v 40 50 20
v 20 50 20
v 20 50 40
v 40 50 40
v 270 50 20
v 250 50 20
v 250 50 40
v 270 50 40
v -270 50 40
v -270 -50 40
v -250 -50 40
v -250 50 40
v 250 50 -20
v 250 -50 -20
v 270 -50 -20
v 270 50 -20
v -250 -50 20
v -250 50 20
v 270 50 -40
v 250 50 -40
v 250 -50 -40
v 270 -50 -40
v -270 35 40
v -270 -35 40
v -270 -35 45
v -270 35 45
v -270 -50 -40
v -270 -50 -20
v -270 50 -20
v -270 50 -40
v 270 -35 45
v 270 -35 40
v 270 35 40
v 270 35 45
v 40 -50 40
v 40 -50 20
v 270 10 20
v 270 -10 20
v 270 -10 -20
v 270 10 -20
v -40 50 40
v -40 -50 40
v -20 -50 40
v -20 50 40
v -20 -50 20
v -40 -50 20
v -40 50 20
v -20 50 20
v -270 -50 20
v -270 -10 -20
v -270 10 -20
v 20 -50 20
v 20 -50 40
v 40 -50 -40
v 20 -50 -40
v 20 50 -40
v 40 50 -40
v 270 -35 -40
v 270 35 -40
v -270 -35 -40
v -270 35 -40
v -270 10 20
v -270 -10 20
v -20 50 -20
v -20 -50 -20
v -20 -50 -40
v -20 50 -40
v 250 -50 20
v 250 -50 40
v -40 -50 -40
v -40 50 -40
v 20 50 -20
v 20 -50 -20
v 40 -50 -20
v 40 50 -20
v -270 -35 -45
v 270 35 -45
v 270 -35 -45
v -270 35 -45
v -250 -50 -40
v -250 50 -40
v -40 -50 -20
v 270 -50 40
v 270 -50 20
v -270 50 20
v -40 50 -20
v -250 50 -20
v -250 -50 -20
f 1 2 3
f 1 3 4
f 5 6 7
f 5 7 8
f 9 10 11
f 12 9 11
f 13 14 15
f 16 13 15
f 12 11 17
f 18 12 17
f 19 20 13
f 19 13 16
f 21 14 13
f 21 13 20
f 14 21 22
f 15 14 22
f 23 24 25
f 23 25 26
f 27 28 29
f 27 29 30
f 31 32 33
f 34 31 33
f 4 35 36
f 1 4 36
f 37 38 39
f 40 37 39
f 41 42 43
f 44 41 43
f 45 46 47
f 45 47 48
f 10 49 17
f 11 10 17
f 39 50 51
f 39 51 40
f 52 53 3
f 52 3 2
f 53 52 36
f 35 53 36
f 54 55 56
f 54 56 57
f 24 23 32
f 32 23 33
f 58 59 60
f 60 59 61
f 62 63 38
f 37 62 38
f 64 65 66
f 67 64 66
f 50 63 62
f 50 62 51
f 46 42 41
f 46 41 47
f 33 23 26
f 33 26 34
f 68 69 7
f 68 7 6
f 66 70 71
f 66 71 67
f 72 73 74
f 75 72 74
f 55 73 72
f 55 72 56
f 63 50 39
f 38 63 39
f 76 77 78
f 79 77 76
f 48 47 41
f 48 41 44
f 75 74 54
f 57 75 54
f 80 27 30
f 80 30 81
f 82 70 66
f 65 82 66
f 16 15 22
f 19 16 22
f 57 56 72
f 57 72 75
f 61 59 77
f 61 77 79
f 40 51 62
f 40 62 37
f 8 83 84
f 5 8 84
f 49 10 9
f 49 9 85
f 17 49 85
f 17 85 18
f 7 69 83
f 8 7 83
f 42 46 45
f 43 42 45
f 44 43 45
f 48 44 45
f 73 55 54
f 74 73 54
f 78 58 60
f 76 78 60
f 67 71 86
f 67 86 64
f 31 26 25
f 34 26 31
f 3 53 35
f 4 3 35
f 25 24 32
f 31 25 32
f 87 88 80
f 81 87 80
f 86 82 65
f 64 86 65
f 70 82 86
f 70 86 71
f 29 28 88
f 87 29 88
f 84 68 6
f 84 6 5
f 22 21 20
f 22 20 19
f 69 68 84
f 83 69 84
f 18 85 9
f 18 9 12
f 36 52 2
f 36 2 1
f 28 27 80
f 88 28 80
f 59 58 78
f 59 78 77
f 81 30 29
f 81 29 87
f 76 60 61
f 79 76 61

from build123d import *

# Parameters (mm, degrees)
BOSS_EXTRUDE2_DEPTH        = 10
BOSS_EXTRUDE2_DEPTH_BACK   = 10
SKETCH2_W                  = 540
SKETCH2_H                  = 40
BOSS_EXTRUDE3_DEPTH        = 50
BOSS_EXTRUDE3_DEPTH_BACK   = 50
SKETCH3_W                  = 20
SKETCH3_H                  = 20
BOSS_EXTRUDE3_2_DEPTH      = 50
BOSS_EXTRUDE3_2_DEPTH_BACK = 50
BOSS_EXTRUDE3_3_DEPTH      = 50
BOSS_EXTRUDE3_3_DEPTH_BACK = 50
BOSS_EXTRUDE3_4_DEPTH      = 50
BOSS_EXTRUDE3_4_DEPTH_BACK = 50
BOSS_EXTRUDE3_5_DEPTH      = 50
BOSS_EXTRUDE3_5_DEPTH_BACK = 50
BOSS_EXTRUDE3_6_DEPTH      = 50
BOSS_EXTRUDE3_6_DEPTH_BACK = 50
BOSS_EXTRUDE3_7_DEPTH      = 50
BOSS_EXTRUDE3_7_DEPTH_BACK = 50
BOSS_EXTRUDE3_8_DEPTH      = 50
BOSS_EXTRUDE3_8_DEPTH_BACK = 50
SKETCH9_W                  = 540
SKETCH9_H                  = 70
BOSS_EXTRUDE10_DEPTH       = 5
SKETCH10_W                 = 540
SKETCH10_H                 = 70
BOSS_EXTRUDE11_DEPTH       = 5


with BuildPart() as part:
    # Sketch2 → Boss-Extrude2 (new, two sides: drawn at the far end of the back side and taken through both)
    with BuildSketch(Plane(origin=(0, 0, 0), x_dir=(1, 0, 0), z_dir=(0, 1, 0)).offset(-BOSS_EXTRUDE2_DEPTH_BACK)):
        Rectangle(SKETCH2_W, SKETCH2_H)
    extrude(amount=BOSS_EXTRUDE2_DEPTH + BOSS_EXTRUDE2_DEPTH_BACK)


with BuildPart() as body_2:
    # Sketch3 → Boss-Extrude3 (new, two sides: drawn at the far end of the back side and taken through both)
    with BuildSketch(Plane(origin=(0, 0, 0), x_dir=(1, 0, 0), z_dir=(0, 1, 0)).offset(-BOSS_EXTRUDE3_DEPTH_BACK)):
        with Locations((-260, -30)):
            Rectangle(SKETCH3_W, SKETCH3_H)
    extrude(amount=BOSS_EXTRUDE3_DEPTH + BOSS_EXTRUDE3_DEPTH_BACK)


with BuildPart() as body_3:
    # Sketch3 → Boss-Extrude3 2 (new, two sides: drawn at the far end of the back side and taken through both)
    with BuildSketch(Plane(origin=(0, 0, 0), x_dir=(1, 0, 0), z_dir=(0, 1, 0)).offset(-BOSS_EXTRUDE3_2_DEPTH_BACK)):
        with Locations((-30, -30)):
            Rectangle(SKETCH3_W, SKETCH3_H)
    extrude(amount=BOSS_EXTRUDE3_2_DEPTH + BOSS_EXTRUDE3_2_DEPTH_BACK)


with BuildPart() as body_4:
    # Sketch3 → Boss-Extrude3 3 (new, two sides: drawn at the far end of the back side and taken through both)
    with BuildSketch(Plane(origin=(0, 0, 0), x_dir=(1, 0, 0), z_dir=(0, 1, 0)).offset(-BOSS_EXTRUDE3_3_DEPTH_BACK)):
        with Locations((-30, 30)):
            Rectangle(SKETCH3_W, SKETCH3_H)
    extrude(amount=BOSS_EXTRUDE3_3_DEPTH + BOSS_EXTRUDE3_3_DEPTH_BACK)


with BuildPart() as body_5:
    # Sketch3 → Boss-Extrude3 4 (new, two sides: drawn at the far end of the back side and taken through both)
    with BuildSketch(Plane(origin=(0, 0, 0), x_dir=(1, 0, 0), z_dir=(0, 1, 0)).offset(-BOSS_EXTRUDE3_4_DEPTH_BACK)):
        with Locations((-260, 30)):
            Rectangle(SKETCH3_W, SKETCH3_H)
    extrude(amount=BOSS_EXTRUDE3_4_DEPTH + BOSS_EXTRUDE3_4_DEPTH_BACK)


with BuildPart() as body_6:
    # Sketch3 → Boss-Extrude3 5 (new, two sides: drawn at the far end of the back side and taken through both)
    with BuildSketch(Plane(origin=(0, 0, 0), x_dir=(1, 0, 0), z_dir=(0, 1, 0)).offset(-BOSS_EXTRUDE3_5_DEPTH_BACK)):
        with Locations((260, 30)):
            Rectangle(SKETCH3_W, SKETCH3_H)
    extrude(amount=BOSS_EXTRUDE3_5_DEPTH + BOSS_EXTRUDE3_5_DEPTH_BACK)


with BuildPart() as body_7:
    # Sketch3 → Boss-Extrude3 6 (new, two sides: drawn at the far end of the back side and taken through both)
    with BuildSketch(Plane(origin=(0, 0, 0), x_dir=(1, 0, 0), z_dir=(0, 1, 0)).offset(-BOSS_EXTRUDE3_6_DEPTH_BACK)):
        with Locations((30, 30)):
            Rectangle(SKETCH3_W, SKETCH3_H)
    extrude(amount=BOSS_EXTRUDE3_6_DEPTH + BOSS_EXTRUDE3_6_DEPTH_BACK)


with BuildPart() as body_8:
    # Sketch3 → Boss-Extrude3 7 (new, two sides: drawn at the far end of the back side and taken through both)
    with BuildSketch(Plane(origin=(0, 0, 0), x_dir=(1, 0, 0), z_dir=(0, 1, 0)).offset(-BOSS_EXTRUDE3_7_DEPTH_BACK)):
        with Locations((30, -30)):
            Rectangle(SKETCH3_W, SKETCH3_H)
    extrude(amount=BOSS_EXTRUDE3_7_DEPTH + BOSS_EXTRUDE3_7_DEPTH_BACK)


with BuildPart() as body_9:
    # Sketch3 → Boss-Extrude3 8 (new, two sides: drawn at the far end of the back side and taken through both)
    with BuildSketch(Plane(origin=(0, 0, 0), x_dir=(1, 0, 0), z_dir=(0, 1, 0)).offset(-BOSS_EXTRUDE3_8_DEPTH_BACK)):
        with Locations((260, -30)):
            Rectangle(SKETCH3_W, SKETCH3_H)
    extrude(amount=BOSS_EXTRUDE3_8_DEPTH + BOSS_EXTRUDE3_8_DEPTH_BACK)


with BuildPart() as body_10:
    # Sketch9 → Boss-Extrude10 (new body)
    with BuildSketch(Plane.XY.offset(40)):
        Rectangle(SKETCH9_W, SKETCH9_H)
    extrude(amount=BOSS_EXTRUDE10_DEPTH)


with BuildPart() as body_11:
    # Sketch10 → Boss-Extrude11 (new body)
    with BuildSketch(Plane(origin=(0, 0, -40), x_dir=(-1, 0, 0), z_dir=(0, 0, -1))):
        Rectangle(SKETCH10_W, SKETCH10_H)
    extrude(amount=BOSS_EXTRUDE11_DEPTH)


solid = Compound([part.part, body_2.part, body_3.part, body_4.part, body_5.part, body_6.part, body_7.part, body_8.part, body_9.part, body_10.part, body_11.part])
